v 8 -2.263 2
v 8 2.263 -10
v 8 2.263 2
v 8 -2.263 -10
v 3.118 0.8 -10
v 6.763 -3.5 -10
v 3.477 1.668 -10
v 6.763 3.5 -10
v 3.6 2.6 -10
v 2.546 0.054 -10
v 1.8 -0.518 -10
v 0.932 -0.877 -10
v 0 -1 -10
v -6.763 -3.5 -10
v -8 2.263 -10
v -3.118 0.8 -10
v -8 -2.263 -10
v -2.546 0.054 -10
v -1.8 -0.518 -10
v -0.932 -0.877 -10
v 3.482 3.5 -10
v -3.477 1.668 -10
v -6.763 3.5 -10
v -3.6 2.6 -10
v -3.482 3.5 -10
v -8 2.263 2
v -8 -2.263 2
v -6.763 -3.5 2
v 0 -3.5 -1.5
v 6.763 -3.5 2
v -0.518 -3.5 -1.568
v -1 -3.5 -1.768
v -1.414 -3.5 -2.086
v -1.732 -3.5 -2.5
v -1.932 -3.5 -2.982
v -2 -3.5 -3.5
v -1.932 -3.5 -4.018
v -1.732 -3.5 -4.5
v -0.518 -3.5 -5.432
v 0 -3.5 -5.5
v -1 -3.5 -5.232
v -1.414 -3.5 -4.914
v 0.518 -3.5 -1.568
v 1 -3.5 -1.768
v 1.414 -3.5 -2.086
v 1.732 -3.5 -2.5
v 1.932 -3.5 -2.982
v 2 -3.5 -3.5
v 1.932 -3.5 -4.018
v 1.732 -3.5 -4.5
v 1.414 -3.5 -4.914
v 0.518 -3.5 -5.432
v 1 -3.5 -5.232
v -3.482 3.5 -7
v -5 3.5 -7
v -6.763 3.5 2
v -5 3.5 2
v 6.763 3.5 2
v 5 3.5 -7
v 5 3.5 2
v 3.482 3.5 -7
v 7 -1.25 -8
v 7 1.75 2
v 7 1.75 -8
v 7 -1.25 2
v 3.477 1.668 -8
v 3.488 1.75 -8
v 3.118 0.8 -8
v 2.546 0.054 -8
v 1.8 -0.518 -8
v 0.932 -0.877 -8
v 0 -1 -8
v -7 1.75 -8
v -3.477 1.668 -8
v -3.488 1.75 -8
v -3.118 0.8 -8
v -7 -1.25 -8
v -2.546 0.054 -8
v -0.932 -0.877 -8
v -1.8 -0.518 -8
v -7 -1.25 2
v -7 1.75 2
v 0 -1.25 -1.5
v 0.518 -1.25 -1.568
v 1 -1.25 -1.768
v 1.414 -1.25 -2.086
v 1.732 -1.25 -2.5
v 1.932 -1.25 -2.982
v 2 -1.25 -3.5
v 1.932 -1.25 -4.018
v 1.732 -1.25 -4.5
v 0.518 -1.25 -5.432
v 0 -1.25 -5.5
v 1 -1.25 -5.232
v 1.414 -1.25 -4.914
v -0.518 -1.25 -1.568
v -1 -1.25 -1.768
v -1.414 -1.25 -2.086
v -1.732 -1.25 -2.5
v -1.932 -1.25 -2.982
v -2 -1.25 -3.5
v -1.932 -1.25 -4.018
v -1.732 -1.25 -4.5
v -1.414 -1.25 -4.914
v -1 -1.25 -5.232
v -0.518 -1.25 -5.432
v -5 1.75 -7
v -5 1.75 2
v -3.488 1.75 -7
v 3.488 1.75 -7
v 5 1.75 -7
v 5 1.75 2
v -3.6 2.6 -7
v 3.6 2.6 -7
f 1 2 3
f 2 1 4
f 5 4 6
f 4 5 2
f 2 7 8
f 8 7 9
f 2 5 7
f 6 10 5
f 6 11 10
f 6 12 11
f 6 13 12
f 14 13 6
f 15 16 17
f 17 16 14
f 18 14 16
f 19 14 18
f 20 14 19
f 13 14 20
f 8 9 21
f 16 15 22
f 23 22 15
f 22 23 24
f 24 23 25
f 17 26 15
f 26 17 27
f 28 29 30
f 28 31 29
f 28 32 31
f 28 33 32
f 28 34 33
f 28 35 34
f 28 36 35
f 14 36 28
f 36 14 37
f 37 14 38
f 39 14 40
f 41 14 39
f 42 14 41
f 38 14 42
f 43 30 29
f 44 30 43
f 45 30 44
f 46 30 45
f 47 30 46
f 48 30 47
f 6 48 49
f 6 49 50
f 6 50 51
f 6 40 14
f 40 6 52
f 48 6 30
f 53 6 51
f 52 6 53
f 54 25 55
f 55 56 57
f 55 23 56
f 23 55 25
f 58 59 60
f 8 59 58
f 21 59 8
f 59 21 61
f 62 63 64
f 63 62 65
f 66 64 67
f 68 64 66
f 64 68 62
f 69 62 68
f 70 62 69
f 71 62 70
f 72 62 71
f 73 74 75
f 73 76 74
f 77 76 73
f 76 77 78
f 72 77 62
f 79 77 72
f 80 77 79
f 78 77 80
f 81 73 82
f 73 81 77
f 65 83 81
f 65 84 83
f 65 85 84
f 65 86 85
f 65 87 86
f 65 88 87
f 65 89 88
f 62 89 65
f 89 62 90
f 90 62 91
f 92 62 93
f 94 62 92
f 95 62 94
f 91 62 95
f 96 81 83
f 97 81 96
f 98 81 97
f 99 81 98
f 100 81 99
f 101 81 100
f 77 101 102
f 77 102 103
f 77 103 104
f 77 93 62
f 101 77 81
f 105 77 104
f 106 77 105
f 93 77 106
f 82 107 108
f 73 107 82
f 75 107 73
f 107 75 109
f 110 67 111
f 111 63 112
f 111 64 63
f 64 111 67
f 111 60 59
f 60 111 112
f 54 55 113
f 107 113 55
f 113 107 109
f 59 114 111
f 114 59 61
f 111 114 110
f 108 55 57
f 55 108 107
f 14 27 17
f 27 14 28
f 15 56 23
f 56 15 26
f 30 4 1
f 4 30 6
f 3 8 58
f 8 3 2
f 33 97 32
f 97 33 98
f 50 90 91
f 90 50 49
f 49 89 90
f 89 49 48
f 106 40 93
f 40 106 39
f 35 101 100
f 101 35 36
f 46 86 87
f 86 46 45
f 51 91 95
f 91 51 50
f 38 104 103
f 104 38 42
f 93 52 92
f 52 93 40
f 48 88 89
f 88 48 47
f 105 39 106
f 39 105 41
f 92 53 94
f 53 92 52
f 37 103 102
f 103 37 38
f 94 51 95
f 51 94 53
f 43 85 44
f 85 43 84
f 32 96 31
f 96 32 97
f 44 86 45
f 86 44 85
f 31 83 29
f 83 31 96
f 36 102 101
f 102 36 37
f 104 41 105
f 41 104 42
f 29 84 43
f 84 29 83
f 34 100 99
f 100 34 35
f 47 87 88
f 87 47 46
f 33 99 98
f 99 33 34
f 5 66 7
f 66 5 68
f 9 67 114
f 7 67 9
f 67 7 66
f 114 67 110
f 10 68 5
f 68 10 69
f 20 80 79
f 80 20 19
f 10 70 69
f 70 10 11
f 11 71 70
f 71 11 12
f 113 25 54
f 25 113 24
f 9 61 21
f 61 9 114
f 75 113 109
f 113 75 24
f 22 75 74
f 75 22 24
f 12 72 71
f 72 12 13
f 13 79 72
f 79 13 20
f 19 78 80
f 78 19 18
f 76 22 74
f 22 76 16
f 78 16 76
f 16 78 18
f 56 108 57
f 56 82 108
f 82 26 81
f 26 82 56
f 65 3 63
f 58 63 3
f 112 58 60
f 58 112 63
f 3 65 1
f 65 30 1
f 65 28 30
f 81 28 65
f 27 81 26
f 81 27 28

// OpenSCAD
module clip(lgt,wid,hgt,rad) {
   difference() {
     cube([lgt,wid,hgt],center=true);
     translate([0,-0.25,-2])
             cube([lgt-2,(4*wid/7)-1,hgt],center=true);
     translate([0,-wid/2,-3])
             cube([lgt-6,wid,hgt],center=true);

      translate([-lgt/2,wid/2,0])
         rotate([0,0,45])
           cube([lgt,wid/4,hgt+2],            center=true);
        translate([-lgt/2,-wid/2,0])
         rotate([0,0,-45])
           cube([lgt,wid/4,hgt+2],            center=true);
        translate([lgt/2,wid/2,0])
         rotate([0,0,-45])
           cube([lgt,wid/4,hgt+2],            center=true);
        translate([lgt/2,-wid/2,0])
         rotate([0,0,45])
           cube([lgt,wid/4,hgt+2],            center=true);
       
        translate([0,0,3.5])
          rotate([90,0,0])
            cylinder(r=rad,h=10,center=true, $fn=24);
	     translate([0,-2.6,5])
              cylinder(r=3.6,h=10,center=true,$fn=24);
   }

}

difference() {
     rotate([180,0,0]) clip(16,7,20,2);
     translate([0,0,7]) cube([20,10,10],center=true);
     }
